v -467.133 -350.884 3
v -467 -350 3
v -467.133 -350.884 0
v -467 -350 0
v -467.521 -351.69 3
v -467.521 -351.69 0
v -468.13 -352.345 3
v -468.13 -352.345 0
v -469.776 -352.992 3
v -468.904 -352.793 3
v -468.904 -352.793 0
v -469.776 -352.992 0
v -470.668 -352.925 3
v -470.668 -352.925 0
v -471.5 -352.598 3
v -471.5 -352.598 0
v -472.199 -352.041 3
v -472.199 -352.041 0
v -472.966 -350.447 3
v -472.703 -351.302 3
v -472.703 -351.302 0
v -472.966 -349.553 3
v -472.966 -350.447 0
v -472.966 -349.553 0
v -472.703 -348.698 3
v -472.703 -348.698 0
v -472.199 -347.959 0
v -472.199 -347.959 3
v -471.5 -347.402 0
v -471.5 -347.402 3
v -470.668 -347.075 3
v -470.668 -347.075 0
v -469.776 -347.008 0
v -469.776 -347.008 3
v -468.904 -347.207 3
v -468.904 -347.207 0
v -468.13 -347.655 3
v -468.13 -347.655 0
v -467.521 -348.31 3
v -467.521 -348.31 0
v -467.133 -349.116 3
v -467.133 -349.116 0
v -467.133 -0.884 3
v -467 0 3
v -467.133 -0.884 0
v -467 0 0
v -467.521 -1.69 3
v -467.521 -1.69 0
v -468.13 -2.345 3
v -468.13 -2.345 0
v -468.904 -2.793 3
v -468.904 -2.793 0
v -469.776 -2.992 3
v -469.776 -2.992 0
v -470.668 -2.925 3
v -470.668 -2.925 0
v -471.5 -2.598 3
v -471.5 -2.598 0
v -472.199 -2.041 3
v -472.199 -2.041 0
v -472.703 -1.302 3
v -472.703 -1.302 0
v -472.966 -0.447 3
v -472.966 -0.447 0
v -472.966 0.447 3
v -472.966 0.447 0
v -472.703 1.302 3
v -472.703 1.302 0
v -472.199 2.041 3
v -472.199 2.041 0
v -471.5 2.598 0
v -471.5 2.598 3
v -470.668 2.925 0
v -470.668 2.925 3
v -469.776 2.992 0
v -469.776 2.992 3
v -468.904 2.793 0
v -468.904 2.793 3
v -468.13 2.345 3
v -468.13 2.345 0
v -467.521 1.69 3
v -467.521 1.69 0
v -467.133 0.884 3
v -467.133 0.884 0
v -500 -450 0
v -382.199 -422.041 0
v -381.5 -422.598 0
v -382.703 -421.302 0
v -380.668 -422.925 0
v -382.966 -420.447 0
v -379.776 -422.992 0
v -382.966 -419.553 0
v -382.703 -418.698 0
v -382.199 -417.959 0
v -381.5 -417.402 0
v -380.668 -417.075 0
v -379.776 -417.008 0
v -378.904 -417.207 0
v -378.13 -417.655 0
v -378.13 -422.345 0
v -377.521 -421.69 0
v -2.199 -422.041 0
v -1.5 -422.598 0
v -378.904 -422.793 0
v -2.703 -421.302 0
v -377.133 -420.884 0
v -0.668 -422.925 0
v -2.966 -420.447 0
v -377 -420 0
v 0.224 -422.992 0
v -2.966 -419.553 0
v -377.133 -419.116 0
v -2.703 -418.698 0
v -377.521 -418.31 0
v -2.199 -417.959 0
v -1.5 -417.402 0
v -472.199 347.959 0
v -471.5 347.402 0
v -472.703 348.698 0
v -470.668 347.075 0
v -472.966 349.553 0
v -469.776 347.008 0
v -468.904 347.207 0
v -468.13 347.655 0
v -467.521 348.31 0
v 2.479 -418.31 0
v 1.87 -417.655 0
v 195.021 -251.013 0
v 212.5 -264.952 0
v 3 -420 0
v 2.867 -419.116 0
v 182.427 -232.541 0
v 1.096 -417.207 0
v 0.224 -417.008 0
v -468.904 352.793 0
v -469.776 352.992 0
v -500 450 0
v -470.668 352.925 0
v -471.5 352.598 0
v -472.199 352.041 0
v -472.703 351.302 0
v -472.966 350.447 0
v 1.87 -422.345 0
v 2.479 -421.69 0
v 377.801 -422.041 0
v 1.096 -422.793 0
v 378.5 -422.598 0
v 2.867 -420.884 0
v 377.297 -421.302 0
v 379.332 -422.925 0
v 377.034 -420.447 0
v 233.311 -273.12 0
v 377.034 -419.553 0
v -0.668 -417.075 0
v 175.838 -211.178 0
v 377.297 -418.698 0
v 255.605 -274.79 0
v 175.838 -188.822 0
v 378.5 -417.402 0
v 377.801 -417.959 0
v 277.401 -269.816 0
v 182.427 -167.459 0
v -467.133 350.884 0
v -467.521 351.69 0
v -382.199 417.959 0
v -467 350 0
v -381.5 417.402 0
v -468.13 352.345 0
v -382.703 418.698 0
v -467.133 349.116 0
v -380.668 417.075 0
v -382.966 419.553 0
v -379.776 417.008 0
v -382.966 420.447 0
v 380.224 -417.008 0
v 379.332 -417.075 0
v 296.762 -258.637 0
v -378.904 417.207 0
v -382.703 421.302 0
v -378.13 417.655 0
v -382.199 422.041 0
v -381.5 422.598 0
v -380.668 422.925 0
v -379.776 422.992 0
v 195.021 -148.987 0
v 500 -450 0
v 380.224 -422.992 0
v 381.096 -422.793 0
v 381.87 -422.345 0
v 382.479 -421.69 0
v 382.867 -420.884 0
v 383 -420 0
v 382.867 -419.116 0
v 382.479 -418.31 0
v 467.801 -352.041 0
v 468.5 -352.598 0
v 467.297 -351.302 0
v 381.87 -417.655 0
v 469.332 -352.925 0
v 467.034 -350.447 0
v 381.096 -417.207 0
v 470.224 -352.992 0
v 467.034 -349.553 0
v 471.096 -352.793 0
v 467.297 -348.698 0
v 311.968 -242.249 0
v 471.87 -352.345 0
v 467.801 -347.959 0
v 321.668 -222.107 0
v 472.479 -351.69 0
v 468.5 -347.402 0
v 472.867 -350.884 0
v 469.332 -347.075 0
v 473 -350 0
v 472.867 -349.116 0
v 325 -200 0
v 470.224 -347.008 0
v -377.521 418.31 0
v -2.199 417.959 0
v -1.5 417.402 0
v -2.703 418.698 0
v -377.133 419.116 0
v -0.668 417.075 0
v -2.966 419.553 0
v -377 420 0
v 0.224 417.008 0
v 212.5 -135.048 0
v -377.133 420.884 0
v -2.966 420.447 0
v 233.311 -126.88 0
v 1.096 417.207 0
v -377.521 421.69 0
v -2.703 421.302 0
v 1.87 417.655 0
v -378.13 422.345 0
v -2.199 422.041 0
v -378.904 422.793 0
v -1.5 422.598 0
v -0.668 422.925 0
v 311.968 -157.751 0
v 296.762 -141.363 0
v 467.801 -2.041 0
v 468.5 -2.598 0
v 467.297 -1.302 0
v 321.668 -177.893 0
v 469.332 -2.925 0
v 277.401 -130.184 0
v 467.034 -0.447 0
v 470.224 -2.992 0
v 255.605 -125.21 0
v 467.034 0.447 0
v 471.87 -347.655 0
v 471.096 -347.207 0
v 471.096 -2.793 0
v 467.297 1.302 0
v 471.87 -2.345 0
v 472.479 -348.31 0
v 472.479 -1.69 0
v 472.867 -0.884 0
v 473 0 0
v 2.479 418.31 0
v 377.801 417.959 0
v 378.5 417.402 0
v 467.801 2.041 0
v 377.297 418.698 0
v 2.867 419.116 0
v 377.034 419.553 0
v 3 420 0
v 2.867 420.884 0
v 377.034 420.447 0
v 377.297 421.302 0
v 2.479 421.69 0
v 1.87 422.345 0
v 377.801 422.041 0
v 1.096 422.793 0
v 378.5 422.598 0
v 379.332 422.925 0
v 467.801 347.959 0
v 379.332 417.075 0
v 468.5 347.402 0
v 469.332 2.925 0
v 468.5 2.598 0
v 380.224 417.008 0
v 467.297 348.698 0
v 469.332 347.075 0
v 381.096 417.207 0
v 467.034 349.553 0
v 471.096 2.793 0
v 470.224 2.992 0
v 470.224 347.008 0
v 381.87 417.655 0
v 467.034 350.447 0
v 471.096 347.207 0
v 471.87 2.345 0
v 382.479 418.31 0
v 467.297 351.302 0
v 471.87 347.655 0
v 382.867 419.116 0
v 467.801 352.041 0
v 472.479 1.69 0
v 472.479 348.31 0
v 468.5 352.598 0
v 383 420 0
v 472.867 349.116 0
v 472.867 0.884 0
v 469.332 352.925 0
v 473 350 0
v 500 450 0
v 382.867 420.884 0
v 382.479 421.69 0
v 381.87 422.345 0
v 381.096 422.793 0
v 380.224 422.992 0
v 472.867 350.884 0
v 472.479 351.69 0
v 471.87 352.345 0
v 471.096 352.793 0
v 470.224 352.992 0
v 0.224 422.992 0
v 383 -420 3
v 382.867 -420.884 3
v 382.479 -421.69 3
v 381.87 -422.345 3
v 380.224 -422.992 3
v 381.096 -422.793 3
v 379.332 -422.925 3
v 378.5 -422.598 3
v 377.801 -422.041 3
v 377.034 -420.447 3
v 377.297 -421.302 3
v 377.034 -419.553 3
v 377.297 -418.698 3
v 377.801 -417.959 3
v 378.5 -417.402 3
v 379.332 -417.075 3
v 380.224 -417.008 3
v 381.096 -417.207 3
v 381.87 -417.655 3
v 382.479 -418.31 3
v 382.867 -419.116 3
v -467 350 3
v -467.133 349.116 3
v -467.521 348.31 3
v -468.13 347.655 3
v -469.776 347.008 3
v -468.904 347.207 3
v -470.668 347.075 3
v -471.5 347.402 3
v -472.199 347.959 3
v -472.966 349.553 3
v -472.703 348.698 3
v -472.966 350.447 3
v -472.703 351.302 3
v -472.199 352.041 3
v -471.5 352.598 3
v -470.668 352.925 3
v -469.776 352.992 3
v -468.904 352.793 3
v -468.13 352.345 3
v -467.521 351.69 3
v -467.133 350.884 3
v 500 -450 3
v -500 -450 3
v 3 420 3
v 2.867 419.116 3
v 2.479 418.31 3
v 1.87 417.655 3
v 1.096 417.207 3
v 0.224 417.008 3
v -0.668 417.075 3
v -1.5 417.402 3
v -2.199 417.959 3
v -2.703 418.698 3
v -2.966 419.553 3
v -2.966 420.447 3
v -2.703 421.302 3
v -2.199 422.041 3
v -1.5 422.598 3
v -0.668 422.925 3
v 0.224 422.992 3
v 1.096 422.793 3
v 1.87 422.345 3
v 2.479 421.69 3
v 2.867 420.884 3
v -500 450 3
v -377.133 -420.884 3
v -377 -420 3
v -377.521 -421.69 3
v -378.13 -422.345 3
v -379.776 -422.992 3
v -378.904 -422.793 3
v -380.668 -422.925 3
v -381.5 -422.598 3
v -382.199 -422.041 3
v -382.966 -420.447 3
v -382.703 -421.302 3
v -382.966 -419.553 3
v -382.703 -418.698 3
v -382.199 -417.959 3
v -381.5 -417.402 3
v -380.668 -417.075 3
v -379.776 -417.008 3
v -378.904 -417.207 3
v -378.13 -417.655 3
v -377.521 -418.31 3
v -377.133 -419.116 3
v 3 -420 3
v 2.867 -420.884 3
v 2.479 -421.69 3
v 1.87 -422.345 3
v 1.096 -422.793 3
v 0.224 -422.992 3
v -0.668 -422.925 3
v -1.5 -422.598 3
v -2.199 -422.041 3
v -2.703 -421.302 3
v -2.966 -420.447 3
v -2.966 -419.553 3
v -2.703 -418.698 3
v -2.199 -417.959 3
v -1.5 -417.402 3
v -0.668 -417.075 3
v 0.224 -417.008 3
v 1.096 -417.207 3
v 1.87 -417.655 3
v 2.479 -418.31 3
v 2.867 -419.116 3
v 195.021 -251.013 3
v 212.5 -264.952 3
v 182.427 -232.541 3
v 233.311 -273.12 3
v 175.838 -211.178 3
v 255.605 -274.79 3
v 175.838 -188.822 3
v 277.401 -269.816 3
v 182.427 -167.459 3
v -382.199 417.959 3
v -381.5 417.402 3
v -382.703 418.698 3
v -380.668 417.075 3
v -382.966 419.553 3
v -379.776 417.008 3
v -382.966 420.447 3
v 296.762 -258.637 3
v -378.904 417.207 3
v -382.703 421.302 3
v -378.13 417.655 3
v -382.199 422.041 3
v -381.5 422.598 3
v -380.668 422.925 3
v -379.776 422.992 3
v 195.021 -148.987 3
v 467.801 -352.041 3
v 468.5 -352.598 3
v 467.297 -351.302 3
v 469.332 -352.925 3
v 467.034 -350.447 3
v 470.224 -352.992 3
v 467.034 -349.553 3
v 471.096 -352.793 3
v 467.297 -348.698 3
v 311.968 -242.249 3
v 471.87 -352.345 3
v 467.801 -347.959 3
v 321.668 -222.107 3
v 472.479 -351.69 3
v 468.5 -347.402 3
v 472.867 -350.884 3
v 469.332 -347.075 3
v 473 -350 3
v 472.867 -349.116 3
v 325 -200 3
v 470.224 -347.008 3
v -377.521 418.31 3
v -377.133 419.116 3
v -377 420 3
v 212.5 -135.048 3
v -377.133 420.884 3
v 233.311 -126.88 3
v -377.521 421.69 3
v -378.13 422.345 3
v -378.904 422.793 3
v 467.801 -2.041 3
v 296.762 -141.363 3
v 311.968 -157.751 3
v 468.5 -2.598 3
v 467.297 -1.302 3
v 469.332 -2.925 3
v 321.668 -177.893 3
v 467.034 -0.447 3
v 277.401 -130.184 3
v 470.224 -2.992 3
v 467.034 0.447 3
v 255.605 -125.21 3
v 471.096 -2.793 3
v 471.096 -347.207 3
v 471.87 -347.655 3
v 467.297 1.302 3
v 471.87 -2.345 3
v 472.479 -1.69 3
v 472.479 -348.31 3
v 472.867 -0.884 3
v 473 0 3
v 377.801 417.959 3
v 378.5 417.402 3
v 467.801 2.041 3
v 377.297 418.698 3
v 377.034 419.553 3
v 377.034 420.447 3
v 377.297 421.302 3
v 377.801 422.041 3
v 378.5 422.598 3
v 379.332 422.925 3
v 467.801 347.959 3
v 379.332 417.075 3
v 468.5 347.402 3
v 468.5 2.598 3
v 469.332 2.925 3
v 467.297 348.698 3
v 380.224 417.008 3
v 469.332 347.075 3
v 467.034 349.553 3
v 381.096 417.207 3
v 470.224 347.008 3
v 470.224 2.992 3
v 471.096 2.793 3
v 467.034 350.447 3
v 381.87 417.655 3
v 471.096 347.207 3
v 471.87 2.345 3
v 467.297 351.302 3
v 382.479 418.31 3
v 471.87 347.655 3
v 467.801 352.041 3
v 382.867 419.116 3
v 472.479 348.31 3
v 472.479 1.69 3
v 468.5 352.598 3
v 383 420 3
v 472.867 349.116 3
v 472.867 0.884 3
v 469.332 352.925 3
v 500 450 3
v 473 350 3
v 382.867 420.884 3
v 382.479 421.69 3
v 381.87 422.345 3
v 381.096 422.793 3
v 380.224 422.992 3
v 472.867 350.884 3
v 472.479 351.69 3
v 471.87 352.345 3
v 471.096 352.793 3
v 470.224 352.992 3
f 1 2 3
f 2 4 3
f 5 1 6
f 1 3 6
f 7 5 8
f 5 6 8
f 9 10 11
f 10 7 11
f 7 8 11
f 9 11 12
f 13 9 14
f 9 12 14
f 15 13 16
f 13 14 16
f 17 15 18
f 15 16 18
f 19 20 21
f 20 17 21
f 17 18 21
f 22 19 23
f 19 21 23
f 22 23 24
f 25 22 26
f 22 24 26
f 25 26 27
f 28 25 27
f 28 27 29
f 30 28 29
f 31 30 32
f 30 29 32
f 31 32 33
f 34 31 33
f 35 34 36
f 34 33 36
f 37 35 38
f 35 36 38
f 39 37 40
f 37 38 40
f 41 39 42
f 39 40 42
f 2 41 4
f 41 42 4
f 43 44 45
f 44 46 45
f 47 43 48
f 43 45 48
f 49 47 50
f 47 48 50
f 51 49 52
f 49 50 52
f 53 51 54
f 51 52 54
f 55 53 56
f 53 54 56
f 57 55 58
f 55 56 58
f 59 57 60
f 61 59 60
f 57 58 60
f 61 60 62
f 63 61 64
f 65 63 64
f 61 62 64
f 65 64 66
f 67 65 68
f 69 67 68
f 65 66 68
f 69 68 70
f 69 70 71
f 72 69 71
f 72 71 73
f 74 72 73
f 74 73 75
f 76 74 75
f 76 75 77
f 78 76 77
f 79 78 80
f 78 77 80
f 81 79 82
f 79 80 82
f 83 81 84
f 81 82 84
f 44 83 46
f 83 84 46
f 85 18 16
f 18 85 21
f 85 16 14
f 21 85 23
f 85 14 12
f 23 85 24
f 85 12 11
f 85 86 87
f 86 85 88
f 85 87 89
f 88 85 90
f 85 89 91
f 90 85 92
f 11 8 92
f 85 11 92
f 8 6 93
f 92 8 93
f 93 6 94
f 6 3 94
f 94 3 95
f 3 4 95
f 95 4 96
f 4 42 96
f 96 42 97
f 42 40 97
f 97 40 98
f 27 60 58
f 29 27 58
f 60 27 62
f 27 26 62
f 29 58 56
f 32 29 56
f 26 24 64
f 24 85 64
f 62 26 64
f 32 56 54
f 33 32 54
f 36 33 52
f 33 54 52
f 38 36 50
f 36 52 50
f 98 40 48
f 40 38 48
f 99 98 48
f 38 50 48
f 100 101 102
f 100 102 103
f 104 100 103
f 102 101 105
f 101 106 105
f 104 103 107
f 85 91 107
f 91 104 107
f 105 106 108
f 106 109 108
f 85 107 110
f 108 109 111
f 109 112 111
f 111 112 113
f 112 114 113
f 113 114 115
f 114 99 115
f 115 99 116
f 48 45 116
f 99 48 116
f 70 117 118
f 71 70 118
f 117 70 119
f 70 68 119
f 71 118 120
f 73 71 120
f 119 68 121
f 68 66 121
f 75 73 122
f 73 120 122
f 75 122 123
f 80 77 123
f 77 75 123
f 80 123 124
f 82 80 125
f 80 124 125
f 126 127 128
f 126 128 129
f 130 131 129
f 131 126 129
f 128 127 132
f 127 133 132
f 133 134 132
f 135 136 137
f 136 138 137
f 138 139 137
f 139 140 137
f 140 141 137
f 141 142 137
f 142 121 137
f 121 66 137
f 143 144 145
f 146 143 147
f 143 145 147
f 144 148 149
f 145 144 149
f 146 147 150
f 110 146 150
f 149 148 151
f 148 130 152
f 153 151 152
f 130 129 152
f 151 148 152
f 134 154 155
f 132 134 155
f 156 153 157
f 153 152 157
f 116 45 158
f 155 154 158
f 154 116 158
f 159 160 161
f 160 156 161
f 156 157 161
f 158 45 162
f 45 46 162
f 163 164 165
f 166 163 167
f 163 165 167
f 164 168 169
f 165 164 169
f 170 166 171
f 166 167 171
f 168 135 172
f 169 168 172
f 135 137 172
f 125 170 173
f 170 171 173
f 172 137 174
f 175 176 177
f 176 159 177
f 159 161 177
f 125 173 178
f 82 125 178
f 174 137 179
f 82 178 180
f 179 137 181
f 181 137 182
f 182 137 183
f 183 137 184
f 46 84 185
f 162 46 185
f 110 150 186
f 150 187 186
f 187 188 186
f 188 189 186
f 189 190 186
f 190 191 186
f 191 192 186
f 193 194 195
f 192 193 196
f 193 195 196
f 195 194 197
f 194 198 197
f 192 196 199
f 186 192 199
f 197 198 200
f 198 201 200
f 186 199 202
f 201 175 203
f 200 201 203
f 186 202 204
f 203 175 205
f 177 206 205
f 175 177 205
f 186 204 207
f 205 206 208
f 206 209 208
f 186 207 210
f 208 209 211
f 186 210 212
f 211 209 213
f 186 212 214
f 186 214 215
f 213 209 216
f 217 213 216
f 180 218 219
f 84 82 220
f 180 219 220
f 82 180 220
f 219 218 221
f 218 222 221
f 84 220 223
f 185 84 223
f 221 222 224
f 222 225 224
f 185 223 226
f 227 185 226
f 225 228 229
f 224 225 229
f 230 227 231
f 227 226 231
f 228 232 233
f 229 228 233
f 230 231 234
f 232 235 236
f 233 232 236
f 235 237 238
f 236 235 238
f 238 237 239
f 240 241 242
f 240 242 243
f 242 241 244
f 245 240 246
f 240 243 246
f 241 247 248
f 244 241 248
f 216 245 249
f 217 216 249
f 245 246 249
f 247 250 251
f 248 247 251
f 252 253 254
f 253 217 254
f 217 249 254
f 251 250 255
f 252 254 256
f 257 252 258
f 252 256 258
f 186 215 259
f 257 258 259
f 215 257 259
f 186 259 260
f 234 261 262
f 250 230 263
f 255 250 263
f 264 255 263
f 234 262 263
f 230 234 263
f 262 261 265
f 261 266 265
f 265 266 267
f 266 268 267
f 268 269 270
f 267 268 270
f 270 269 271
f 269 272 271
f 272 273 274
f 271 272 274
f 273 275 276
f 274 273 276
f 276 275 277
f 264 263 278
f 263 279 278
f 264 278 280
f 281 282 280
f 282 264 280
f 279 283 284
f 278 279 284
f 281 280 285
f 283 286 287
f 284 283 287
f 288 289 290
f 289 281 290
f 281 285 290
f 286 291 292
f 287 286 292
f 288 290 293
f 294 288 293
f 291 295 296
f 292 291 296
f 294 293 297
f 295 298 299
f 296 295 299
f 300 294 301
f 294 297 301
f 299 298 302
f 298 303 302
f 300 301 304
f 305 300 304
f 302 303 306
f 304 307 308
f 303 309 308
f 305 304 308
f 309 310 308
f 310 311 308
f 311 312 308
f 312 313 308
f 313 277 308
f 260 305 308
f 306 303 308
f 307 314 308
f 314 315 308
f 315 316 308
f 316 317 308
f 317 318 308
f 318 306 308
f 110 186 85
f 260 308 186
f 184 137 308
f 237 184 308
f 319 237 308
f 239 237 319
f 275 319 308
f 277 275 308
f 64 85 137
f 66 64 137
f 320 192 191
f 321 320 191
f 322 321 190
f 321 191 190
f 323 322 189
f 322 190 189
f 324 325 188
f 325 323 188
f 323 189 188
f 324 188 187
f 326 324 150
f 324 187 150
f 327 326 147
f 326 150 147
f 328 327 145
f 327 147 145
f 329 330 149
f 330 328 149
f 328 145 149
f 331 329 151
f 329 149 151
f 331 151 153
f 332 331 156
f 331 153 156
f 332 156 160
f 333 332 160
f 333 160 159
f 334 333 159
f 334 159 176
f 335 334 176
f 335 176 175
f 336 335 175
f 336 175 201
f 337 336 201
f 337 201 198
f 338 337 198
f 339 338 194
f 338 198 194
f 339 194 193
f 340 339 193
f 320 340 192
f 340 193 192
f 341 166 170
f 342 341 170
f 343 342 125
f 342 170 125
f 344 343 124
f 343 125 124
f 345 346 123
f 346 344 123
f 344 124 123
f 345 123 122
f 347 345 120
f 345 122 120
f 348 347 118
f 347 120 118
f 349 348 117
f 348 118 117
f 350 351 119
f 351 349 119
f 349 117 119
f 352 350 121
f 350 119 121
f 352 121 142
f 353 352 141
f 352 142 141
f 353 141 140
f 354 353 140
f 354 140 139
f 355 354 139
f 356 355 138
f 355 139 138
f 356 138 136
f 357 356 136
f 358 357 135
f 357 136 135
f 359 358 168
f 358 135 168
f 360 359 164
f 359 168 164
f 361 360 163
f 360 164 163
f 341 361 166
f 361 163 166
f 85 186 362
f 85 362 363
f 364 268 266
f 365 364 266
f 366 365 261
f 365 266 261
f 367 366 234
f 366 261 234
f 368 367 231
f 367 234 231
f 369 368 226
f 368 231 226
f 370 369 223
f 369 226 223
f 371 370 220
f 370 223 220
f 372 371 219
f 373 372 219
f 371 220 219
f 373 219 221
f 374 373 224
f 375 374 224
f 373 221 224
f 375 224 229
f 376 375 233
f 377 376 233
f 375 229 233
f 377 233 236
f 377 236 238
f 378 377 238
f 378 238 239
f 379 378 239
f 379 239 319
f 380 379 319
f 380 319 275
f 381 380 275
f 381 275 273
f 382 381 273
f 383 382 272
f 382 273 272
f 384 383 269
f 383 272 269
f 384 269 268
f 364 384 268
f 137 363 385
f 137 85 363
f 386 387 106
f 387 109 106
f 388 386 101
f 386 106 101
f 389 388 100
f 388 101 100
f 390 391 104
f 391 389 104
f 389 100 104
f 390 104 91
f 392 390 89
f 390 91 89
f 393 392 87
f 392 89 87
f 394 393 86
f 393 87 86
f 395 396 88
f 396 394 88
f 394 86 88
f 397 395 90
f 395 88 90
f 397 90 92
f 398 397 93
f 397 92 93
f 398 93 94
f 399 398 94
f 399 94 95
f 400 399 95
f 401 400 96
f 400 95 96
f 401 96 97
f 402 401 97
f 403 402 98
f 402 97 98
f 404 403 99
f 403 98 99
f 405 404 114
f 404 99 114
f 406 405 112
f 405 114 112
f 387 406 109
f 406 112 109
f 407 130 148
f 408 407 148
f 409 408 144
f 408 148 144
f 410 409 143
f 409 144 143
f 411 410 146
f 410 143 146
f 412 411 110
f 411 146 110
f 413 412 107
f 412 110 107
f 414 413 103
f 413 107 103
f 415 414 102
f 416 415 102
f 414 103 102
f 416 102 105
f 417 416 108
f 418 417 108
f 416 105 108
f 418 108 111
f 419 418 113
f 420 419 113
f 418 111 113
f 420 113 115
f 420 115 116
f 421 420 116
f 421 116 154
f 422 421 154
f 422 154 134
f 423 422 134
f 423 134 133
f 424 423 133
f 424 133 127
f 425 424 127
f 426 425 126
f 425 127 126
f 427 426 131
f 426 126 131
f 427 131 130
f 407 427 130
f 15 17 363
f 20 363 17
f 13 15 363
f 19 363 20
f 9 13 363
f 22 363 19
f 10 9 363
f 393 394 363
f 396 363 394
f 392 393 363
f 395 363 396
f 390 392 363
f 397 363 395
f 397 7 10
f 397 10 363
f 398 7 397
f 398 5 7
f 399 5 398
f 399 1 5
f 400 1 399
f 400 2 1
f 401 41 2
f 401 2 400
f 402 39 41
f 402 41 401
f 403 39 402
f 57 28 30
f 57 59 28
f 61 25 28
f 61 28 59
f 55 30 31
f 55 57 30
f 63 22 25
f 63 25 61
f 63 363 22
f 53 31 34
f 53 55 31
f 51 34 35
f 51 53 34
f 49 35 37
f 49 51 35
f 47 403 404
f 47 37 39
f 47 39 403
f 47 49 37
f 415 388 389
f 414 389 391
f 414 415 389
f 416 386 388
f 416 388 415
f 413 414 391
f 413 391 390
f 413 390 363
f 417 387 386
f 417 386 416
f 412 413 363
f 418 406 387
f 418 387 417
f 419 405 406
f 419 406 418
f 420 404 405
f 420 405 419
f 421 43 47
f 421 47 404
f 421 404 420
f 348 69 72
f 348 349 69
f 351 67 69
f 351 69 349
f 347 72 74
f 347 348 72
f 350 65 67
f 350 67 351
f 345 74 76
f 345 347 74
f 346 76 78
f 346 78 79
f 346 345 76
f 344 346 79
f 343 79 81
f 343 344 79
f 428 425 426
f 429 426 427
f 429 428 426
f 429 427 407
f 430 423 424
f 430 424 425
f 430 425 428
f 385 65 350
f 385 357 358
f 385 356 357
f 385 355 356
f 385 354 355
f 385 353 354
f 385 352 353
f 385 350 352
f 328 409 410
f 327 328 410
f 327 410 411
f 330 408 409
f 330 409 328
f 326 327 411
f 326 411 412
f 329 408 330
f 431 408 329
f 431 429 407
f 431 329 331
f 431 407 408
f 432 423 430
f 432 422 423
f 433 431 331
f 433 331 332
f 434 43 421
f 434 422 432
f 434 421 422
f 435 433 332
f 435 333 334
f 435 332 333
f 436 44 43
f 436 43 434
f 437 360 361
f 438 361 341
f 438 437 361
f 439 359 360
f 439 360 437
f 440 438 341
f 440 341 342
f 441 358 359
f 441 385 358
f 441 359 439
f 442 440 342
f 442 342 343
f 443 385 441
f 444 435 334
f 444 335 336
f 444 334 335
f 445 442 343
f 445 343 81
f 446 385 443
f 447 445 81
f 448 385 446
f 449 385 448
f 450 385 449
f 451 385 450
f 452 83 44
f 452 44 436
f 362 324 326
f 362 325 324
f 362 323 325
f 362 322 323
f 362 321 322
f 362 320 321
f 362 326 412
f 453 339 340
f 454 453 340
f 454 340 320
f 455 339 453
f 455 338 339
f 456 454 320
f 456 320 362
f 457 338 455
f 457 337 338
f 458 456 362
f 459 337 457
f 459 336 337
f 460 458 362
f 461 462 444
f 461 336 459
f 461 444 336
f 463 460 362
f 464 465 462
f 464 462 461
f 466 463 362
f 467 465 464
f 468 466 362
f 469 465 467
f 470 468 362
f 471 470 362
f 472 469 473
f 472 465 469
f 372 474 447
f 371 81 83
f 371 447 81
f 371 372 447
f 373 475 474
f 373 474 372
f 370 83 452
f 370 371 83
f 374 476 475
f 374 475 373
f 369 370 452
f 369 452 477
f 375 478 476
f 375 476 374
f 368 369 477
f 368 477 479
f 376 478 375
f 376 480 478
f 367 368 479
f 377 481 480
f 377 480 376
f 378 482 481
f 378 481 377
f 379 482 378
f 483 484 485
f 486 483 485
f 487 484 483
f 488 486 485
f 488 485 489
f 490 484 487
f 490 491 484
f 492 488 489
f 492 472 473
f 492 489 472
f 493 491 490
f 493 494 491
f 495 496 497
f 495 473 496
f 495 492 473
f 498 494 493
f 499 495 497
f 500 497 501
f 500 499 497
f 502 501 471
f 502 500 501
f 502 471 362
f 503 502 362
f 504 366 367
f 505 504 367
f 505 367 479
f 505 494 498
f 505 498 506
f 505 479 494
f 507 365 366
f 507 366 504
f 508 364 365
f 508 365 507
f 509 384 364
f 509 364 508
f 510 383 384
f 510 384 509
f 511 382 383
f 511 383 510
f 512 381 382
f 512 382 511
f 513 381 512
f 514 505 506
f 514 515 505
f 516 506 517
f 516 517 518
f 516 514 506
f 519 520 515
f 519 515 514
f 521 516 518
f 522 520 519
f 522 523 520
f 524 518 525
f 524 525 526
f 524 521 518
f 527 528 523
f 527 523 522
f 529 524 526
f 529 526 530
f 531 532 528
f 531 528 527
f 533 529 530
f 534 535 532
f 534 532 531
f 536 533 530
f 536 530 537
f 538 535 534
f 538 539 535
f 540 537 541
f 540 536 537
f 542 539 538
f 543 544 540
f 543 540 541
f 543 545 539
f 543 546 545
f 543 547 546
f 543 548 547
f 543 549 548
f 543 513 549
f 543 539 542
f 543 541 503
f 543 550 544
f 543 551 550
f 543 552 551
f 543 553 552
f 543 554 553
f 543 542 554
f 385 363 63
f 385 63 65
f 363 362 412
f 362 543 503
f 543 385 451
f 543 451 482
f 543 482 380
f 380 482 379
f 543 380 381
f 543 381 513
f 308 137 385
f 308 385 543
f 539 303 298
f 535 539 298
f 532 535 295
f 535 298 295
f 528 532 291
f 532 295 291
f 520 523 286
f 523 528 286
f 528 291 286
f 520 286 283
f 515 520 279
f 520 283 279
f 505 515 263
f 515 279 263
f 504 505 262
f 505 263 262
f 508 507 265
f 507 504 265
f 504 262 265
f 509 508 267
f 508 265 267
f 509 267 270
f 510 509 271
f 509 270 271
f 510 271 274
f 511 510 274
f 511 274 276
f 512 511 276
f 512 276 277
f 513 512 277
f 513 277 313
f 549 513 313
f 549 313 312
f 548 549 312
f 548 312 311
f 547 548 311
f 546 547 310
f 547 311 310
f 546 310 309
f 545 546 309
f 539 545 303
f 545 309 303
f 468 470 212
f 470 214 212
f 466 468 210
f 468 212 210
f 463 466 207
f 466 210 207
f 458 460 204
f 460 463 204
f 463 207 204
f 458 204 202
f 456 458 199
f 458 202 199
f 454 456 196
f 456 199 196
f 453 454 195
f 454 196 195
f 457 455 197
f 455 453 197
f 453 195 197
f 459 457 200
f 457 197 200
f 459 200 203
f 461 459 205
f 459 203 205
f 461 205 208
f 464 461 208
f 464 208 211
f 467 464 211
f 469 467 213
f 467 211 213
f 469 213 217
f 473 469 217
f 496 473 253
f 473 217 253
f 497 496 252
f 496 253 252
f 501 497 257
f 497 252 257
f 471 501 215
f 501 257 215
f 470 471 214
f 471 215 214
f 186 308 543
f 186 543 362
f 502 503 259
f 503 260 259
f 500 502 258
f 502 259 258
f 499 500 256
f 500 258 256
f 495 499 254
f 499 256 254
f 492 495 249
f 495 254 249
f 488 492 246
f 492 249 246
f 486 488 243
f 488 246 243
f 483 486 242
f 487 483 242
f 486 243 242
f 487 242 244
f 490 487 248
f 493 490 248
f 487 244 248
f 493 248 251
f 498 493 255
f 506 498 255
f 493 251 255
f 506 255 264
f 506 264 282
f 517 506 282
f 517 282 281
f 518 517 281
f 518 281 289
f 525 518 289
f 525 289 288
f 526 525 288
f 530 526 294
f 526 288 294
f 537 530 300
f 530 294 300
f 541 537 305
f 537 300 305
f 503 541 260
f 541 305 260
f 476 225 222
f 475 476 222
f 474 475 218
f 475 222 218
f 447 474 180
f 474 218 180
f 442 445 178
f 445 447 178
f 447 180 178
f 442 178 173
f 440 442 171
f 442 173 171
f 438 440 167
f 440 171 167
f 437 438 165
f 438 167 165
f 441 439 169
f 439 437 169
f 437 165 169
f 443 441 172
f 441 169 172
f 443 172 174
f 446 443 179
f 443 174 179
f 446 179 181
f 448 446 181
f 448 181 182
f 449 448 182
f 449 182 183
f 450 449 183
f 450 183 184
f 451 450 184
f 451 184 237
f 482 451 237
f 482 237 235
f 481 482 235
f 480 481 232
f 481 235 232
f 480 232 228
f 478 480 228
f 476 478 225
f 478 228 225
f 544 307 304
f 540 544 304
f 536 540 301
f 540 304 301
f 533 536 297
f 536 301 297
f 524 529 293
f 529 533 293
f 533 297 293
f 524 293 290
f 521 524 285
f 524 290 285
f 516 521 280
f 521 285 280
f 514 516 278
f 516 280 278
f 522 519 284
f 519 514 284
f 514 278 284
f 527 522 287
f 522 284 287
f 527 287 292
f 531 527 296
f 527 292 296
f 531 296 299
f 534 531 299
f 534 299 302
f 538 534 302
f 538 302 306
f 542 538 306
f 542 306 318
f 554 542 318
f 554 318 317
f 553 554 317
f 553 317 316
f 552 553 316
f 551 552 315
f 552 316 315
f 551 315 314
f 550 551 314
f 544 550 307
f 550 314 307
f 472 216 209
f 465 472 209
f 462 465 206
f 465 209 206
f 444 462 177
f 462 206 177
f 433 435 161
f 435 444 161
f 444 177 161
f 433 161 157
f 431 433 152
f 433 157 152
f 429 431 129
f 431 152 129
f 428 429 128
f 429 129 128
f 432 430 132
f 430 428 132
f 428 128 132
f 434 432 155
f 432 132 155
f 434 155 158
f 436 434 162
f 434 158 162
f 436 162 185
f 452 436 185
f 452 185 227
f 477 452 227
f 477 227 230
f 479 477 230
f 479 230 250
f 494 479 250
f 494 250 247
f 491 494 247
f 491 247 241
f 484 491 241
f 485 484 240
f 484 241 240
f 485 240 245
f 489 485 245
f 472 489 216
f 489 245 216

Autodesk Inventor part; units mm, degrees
ref_plane "YZ Plane" through (0, 0, 0) normal (1, 0, 0) x (0, 1, 0)
ref_plane "XZ Plane" through (0, 0, 0) normal (0, 1, 0) x (-1, 0, 0)
ref_plane "XY Plane" through (0, 0, 0) normal (0, 0, 1) x (1, 0, 0)
sketch "Szkic1" plane through (0, 0, 0) normal (0, 0, 1) x (1, 0, 0)
  line L0 (500, -450) -> (-500, -450)
  line L1 (-500, -450) -> (-500, 450)
  line L2 (-500, 450) -> (500, 450)
  line L3 (500, 450) -> (500, -450)
  line L4 (500, -450) -> (-500, 450) construction
  line L5 (-500, -450) -> (500, 450) construction
  circle A0 centre (250, -200) radius 75
  line L6 (505, -455) -> (-505, -455) construction
  line L7 (-505, -455) -> (-505, 455) construction
  line L8 (-505, 455) -> (505, 455) construction
  line L9 (505, 455) -> (505, -455) construction
  line L10 (505, -455) -> (-505, 455) construction
  line L11 (-505, -455) -> (505, 455) construction
  line L12 (480, -430) -> (-480, -430) construction
  line L13 (-480, -430) -> (-480, 430) construction
  line L14 (-480, 430) -> (480, 430) construction
  line L15 (480, 430) -> (480, -430) construction
  line L16 (480, -430) -> (-480, 430) construction
  line L17 (-480, -430) -> (480, 430) construction
  circle A1 centre (-470, 0) radius 3
  circle A2 centre (-470, 350) radius 3
  circle A3 centre (-470, -350) radius 3
  circle A4 centre (-470, 0) radius 3
  line L18 (0, -722.0928) -> (0, 703.6821) projected
  line L19 (480, -430) -> (480, 430) construction
  circle A5 centre (470, 350) radius 3
  circle A6 centre (470, -350) radius 3
  circle A7 centre (470, 0) radius 3
  circle A8 centre (0, 420) radius 3
  circle A9 centre (380, 420) radius 3
  circle A10 centre (-380, 420) radius 3
  circle A11 centre (0, 420) radius 3
  line L20 (-763, 0) -> (763, 0) projected
  circle A12 centre (0, -420) radius 3
  circle A13 centre (380, -420) radius 3
  circle A14 centre (-380, -420) radius 3
  line L21 (545, -500) -> (-545, -500) construction
  line L22 (-545, -500) -> (-545, 500) construction
  line L23 (-545, 500) -> (545, 500) construction
  line L24 (545, 500) -> (545, -500) construction
  line L25 (545, -500) -> (-545, 500) construction
  line L26 (-545, -500) -> (545, 500) construction
  line L27 (-372.8845, -485.3907) -> (-256.6542, -485.3907) construction
  line L28 (-256.6542, -485.3907) -> (-256.6542, -518.4107) construction
  line L29 (-256.6542, -518.4107) -> (-372.8845, -518.4107) construction
  line L30 (-372.8845, -518.4107) -> (-372.8845, -485.3907) construction
  point P0 (0, 0)
  dimension "d0" = 1000
  dimension "d1" = 900
  dimension "d2" = 150
  dimension "d3" = 250
  dimension "d4" = 250
  dimension "d5" = 1010
  dimension "d6" = 910
  dimension "d7" = 25
  dimension "d8" = 25
  dimension "d9" = 6
  dimension "d10" = 10
  dimension "d13" = 350
  dimension "d16" = 350
  dimension "d19" = 6
  dimension "d20" = 10
  dimension "d23" = 380
  dimension "d26" = 380
  dimension "d31" = 1090
  dimension "d32" = 1000
extrude "Wyciągnięcie proste1" add sketch "Szkic1" along normal blind 3 contours L0 L18 A12 L20 A7 L3 | L0 L1 L20 A1 L18 A12 | L20 A7 L18 A8 L2 L3 | L1 L2 L18 A8 L20 A1
properties part number "PLEXI 1"
